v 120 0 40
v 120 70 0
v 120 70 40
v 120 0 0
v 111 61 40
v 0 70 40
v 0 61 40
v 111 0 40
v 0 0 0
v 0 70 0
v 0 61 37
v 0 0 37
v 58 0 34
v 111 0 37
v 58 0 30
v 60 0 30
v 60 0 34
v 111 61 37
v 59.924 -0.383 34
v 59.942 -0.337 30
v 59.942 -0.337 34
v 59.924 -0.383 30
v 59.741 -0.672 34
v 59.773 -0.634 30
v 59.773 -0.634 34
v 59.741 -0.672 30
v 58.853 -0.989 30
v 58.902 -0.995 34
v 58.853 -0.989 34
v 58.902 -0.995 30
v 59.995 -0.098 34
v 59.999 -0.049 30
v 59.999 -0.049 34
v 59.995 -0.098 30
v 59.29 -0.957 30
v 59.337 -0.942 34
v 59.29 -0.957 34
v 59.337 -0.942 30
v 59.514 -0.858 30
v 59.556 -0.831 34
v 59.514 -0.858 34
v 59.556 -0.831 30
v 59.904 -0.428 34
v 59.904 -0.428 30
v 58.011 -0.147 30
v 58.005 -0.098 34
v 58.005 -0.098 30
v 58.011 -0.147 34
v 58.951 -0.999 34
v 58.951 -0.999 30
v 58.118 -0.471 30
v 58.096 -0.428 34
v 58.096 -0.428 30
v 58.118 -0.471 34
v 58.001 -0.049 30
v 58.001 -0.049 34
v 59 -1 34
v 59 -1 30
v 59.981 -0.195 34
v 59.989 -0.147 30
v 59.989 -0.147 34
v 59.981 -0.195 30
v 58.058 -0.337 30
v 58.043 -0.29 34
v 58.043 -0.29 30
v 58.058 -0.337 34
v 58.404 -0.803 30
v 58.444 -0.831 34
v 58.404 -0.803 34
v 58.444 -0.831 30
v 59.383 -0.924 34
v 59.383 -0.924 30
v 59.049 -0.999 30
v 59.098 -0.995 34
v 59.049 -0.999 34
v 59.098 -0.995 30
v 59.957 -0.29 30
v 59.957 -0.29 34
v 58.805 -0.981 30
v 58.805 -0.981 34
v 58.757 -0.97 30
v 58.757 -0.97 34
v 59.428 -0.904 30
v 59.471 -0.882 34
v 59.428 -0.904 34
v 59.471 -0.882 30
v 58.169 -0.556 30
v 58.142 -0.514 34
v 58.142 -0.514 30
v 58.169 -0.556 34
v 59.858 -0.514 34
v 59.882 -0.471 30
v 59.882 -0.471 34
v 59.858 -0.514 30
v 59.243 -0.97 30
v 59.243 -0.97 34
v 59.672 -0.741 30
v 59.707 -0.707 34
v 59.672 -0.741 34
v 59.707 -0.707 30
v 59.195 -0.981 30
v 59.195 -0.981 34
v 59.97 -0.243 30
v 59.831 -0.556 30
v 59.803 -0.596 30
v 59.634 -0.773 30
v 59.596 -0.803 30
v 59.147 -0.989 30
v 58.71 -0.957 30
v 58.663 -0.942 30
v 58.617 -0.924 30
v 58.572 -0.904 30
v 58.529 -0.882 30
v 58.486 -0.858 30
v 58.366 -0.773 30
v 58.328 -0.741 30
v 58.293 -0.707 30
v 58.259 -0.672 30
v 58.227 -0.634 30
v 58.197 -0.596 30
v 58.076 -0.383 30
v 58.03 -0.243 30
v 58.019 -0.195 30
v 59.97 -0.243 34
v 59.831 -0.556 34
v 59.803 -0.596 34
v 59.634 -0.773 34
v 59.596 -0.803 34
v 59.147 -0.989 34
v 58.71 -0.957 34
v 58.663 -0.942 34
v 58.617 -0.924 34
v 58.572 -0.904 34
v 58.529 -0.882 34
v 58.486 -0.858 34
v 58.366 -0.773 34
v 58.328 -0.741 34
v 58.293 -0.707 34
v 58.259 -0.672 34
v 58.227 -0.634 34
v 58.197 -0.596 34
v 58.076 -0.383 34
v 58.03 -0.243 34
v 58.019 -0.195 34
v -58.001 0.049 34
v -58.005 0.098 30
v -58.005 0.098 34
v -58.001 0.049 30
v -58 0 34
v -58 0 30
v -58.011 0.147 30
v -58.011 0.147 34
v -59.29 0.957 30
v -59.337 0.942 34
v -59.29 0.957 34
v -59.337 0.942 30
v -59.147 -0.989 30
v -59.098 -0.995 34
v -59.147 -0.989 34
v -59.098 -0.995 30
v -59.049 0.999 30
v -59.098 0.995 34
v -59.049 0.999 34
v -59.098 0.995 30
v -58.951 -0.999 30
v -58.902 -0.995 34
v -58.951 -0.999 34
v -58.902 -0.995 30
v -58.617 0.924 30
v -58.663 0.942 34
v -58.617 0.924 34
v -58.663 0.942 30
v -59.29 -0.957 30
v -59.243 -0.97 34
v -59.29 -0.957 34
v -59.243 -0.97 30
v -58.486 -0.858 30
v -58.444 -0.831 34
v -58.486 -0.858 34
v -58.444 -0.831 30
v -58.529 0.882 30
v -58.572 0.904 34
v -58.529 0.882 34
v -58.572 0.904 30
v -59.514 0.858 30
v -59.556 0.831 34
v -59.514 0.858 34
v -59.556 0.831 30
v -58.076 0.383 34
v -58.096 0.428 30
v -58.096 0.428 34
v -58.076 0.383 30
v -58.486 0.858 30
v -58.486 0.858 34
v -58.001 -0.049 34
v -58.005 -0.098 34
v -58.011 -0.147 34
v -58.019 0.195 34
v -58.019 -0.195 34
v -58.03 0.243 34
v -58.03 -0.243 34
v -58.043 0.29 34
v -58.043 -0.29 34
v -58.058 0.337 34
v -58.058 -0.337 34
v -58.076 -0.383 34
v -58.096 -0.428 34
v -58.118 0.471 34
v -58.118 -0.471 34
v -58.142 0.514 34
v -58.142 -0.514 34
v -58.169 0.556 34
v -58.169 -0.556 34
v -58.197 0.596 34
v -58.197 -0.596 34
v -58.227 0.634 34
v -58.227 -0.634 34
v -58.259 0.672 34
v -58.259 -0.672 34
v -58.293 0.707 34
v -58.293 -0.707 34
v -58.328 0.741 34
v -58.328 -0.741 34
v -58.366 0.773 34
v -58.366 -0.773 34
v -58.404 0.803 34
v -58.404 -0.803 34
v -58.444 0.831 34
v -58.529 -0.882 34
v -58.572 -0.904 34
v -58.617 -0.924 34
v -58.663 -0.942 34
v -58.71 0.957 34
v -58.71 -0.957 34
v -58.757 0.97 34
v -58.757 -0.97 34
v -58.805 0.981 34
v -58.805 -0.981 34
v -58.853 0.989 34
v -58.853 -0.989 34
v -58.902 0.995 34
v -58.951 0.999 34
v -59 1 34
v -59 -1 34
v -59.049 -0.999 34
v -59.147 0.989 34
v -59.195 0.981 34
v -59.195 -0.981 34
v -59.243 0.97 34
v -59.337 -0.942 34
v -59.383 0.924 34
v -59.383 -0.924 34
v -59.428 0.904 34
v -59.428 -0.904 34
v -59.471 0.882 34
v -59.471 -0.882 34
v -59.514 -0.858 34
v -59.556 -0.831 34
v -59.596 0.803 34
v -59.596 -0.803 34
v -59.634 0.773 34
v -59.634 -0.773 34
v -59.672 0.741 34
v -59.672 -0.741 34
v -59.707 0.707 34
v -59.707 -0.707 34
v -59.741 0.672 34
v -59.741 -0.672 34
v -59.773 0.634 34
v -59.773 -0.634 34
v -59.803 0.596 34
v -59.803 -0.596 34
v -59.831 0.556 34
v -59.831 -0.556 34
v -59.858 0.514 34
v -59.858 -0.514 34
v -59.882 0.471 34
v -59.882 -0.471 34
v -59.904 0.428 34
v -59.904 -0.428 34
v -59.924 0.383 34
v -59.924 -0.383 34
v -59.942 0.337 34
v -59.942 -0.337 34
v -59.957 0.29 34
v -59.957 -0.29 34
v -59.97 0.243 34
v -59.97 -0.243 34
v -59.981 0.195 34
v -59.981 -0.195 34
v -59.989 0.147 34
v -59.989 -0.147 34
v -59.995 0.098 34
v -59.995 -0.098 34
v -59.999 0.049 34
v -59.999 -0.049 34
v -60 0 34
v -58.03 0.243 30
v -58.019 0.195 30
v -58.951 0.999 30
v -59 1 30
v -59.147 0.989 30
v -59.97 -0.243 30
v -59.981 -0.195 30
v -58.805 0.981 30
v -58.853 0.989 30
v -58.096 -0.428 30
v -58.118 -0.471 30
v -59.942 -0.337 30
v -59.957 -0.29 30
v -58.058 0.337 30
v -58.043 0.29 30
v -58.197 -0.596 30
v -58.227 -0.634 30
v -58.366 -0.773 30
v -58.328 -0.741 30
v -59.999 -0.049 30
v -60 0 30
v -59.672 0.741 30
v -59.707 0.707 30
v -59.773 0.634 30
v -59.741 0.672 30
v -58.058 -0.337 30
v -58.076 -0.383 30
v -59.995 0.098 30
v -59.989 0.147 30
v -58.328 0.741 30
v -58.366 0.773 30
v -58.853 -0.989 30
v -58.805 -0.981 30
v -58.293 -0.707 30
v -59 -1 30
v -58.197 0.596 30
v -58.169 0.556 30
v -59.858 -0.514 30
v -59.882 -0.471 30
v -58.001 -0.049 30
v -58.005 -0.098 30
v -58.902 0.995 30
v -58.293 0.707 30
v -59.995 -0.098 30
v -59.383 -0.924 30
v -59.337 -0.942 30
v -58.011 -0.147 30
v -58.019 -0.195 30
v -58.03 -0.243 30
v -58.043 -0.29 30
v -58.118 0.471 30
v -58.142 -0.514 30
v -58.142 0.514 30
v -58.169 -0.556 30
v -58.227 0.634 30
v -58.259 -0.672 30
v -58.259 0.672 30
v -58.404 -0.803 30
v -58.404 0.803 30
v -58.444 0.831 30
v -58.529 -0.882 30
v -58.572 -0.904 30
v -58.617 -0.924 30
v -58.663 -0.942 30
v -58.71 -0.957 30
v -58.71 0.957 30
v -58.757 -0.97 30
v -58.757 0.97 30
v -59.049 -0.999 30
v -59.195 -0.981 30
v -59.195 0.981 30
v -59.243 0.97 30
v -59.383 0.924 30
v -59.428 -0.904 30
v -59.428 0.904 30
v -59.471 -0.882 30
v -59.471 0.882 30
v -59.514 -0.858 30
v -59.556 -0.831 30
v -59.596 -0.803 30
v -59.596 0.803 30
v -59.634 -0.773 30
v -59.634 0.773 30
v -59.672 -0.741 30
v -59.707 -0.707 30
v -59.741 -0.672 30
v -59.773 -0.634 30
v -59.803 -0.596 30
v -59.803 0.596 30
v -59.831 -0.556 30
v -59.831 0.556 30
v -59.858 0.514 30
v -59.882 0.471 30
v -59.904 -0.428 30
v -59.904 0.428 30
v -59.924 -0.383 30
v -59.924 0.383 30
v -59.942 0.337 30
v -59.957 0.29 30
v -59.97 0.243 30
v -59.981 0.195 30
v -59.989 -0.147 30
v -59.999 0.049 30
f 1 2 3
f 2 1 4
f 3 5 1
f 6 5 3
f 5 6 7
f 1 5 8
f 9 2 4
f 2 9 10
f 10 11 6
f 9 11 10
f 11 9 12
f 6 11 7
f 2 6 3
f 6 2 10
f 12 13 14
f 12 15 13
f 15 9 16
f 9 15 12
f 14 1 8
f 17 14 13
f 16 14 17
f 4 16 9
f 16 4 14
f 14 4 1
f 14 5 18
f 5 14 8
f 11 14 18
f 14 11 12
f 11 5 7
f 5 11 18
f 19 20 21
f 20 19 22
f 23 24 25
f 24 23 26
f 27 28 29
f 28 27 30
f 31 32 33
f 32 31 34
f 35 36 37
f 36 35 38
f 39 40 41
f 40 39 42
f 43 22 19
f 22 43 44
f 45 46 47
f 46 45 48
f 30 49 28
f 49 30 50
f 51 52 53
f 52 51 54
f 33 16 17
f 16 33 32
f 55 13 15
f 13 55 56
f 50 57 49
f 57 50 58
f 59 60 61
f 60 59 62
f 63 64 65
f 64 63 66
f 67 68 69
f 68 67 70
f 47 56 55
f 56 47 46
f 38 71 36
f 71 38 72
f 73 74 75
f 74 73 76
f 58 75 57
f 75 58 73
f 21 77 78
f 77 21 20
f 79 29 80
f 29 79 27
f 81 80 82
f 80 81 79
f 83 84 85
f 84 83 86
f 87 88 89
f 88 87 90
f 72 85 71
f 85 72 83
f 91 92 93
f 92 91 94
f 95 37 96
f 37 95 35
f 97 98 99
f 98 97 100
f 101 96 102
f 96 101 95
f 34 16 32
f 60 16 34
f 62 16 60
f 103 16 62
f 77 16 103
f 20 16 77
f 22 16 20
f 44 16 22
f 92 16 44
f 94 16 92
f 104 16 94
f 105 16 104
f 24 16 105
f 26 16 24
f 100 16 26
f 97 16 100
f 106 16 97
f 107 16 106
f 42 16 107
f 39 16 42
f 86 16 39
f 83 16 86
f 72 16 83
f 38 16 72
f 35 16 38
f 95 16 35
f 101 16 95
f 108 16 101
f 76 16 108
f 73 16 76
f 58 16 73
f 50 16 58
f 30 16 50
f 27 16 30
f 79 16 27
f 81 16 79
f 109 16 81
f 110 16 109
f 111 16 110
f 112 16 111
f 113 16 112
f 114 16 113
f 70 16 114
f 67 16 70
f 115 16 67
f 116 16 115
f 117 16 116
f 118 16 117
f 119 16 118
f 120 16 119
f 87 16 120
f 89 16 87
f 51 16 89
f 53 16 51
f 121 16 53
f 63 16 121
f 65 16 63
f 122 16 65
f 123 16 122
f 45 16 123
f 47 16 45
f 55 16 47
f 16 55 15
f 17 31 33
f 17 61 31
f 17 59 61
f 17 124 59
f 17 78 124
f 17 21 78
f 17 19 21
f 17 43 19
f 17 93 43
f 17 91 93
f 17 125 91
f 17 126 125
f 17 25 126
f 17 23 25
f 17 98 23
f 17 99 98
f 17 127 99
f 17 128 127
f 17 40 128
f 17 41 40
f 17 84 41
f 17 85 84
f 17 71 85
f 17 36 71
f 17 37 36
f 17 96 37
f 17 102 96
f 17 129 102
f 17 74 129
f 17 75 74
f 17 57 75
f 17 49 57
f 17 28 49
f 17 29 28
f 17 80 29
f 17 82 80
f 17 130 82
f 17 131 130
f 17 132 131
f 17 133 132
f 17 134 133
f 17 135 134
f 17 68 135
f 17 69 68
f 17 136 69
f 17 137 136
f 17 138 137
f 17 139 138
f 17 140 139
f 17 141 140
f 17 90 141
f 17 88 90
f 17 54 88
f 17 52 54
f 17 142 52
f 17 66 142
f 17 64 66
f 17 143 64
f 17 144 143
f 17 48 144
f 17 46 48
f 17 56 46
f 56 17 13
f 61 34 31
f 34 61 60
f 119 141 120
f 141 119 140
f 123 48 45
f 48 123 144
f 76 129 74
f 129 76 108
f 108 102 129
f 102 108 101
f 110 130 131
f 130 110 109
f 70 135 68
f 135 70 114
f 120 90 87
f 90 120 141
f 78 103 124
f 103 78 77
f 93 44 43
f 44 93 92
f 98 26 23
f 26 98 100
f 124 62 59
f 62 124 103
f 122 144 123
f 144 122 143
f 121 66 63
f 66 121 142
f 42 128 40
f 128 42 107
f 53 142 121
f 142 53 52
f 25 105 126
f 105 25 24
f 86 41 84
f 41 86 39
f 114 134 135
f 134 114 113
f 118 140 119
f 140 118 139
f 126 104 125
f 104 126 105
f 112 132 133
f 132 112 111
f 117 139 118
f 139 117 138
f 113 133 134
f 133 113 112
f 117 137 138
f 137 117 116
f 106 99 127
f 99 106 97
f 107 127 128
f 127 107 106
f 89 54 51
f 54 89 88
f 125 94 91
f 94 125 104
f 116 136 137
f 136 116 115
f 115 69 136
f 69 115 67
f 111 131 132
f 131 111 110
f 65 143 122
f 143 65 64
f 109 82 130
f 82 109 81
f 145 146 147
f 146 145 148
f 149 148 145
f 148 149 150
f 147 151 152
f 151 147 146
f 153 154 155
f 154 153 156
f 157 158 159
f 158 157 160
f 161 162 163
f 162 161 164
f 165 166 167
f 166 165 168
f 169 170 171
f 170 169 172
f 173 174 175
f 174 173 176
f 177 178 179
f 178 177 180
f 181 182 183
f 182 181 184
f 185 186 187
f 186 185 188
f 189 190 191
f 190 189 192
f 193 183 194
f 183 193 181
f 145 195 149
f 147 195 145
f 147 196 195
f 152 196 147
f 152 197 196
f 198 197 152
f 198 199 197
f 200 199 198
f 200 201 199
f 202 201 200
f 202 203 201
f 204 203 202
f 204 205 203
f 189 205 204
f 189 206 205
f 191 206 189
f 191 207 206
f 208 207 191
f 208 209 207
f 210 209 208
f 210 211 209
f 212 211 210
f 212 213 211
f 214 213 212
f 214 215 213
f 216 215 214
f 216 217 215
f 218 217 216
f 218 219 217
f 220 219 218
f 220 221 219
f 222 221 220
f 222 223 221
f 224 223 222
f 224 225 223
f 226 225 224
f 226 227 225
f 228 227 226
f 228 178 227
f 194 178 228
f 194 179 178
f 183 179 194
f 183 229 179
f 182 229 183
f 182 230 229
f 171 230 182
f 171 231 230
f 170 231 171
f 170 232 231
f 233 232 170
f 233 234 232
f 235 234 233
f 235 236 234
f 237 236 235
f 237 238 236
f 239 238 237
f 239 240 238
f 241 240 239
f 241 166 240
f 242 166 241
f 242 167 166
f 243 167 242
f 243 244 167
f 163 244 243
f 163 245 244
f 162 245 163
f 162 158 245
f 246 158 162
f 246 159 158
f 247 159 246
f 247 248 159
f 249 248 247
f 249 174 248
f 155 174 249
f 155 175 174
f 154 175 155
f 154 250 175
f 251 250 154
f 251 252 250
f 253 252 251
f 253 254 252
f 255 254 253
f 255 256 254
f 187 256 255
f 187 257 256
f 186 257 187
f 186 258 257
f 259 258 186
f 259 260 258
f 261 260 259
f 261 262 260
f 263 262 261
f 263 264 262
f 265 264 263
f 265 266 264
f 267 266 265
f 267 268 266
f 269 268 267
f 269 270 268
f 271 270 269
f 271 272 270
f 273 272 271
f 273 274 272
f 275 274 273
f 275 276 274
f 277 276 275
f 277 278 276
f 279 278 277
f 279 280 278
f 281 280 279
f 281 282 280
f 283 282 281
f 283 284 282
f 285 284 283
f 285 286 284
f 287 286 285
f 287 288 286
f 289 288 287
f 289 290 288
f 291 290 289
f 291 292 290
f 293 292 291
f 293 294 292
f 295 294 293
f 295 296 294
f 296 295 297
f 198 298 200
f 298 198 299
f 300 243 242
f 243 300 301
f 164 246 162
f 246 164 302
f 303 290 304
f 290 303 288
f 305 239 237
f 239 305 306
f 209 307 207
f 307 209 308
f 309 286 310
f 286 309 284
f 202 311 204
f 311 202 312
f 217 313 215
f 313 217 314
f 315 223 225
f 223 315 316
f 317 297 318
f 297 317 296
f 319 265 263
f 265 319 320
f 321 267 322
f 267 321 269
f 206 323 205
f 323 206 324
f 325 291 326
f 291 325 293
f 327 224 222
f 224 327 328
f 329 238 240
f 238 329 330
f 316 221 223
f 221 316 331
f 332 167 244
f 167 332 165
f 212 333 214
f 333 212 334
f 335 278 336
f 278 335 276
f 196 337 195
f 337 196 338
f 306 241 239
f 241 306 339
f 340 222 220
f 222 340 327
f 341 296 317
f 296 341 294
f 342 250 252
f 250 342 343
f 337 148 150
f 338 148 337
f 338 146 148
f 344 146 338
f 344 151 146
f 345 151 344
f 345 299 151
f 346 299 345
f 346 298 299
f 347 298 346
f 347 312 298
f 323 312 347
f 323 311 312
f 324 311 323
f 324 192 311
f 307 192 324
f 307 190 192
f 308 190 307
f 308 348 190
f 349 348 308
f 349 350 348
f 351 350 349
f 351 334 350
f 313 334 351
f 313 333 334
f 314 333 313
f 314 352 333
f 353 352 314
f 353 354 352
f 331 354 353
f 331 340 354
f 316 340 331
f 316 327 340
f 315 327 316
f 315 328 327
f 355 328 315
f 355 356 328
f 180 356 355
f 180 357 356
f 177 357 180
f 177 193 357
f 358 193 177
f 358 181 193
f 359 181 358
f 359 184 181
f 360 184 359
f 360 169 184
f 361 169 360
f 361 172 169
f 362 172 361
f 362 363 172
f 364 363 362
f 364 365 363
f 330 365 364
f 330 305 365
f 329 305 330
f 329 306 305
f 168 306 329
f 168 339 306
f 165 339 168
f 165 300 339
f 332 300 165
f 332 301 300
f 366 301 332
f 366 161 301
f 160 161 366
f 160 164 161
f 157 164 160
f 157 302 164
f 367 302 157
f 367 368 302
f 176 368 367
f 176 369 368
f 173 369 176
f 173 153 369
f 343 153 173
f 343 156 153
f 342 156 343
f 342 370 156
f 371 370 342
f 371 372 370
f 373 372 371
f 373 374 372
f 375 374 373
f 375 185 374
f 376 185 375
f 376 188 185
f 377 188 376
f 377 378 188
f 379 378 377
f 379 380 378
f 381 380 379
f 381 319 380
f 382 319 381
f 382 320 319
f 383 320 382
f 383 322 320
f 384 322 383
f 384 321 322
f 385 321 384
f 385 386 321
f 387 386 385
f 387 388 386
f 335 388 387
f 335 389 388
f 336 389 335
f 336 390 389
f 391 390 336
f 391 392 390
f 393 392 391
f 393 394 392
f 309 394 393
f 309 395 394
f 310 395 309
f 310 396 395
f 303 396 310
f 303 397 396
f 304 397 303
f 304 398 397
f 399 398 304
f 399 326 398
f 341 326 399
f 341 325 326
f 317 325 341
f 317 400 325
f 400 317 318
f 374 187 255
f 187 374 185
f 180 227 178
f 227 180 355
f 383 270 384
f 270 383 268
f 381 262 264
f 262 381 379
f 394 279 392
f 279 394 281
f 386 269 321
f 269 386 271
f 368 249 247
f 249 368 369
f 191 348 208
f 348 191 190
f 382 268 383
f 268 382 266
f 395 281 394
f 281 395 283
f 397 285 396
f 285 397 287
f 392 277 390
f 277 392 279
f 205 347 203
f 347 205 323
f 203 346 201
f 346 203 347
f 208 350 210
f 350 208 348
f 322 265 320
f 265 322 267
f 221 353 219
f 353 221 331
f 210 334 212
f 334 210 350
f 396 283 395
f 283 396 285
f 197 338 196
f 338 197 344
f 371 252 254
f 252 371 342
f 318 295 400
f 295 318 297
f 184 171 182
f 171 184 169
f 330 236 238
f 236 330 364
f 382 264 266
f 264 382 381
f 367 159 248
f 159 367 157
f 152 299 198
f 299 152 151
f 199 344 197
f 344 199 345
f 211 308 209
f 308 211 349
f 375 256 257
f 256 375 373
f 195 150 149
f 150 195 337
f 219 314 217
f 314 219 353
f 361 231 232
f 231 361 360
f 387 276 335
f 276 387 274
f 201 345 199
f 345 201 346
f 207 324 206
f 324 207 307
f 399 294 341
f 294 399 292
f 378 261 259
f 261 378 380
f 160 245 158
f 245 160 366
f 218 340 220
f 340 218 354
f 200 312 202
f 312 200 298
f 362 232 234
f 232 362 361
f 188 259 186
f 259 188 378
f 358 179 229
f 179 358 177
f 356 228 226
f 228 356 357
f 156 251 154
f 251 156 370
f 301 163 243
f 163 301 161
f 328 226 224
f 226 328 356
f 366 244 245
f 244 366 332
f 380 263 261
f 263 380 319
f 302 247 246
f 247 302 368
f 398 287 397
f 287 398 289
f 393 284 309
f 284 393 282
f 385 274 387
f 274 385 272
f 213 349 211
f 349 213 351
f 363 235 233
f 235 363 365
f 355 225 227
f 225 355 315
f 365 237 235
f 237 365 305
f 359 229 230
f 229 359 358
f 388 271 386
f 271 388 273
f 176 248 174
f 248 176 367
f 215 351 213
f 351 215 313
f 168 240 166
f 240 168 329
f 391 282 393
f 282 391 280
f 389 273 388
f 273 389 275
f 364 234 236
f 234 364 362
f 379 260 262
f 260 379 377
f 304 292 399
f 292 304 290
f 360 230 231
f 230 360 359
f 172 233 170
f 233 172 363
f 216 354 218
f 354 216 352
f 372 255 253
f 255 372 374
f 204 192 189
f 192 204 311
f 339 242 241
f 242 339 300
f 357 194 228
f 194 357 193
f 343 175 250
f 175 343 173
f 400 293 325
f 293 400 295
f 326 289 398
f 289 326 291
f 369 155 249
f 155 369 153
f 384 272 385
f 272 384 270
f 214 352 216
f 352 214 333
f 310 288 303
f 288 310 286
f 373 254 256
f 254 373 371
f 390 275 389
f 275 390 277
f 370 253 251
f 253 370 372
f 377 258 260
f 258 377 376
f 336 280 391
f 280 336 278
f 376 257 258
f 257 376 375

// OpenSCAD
// Buffer Tank for Mini Horizontal Gel Electrophoresis
// Units: millimetres

// Outer Dimensions
$w_outer = 120; // Width (X)
$d_outer = 70;  // Depth (Y)
$h_outer = 40;  // Height (Z)

// Wall and Floor Thickness
$wall_thick = 3;
$floor_thick = 3;

// Platform Dimensions
$plat_len = 60;   // Length in X
$plat_width = $d_outer; // Spans full inner width
$plat_height = 10; // Height above inner floor
$plat_z_base = $floor_thick + $plat_height; // Z position of platform top

// Hole Dimensions
$hole_dia = 2;
$hole_y = 0;
$hole_z = 30;

// Configuration
$fn = 128; // High resolution for smooth curves

// Derived Dimensions
$w_inner = $w_outer - 2*$wall_thick;
$d_inner = $d_outer - 2*$wall_thick;
$h_inner = $h_outer - $floor_thick;

// Main Tank Body (Open Top)
// Constructed by taking a solid block and subtracting the top opening
difference() {
    // 1. Solid Block
    cube([
        $w_outer, 
        $d_outer, 
        $h_outer
    ]);
    
    // 2. Cut out the top opening (Open Top)
    // The opening is the inner dimensions, extending from the top down to the floor thickness
    translate([
        -$wall_thick, 
        -$wall_thick, 
        $h_outer - $floor_thick
    ])
    cube([
        $w_inner, 
        $d_inner, 
        $floor_thick
    ]);
}

// Platform (Raised in the middle)
// Positioned relative to the tank body
translate([
    ($w_outer - $plat_len)/2, // Center in X
    0,                         // Center in Y (aligned with tank center)
    $floor_thick              // Base on the floor
])
difference() {
    // 1. Solid Platform Block
    cube([
        $plat_len, 
        $plat_width, 
        $plat_height
    ]);
    
    // 2. Cut out the top opening of the platform (to match tank opening)
    // The platform is solid up to its top, but the tank opening cuts through it.
    // We need to subtract the volume of the tank opening that overlaps with the platform.
    // Tank opening top is at z = h_outer - floor_thick.
    // Platform top is at z = floor_thick + plat_height.
    // Since the tank is open top, the platform is effectively cut through at the tank's top level.
    
    // Calculate the Z range to cut: from platform top down to the tank opening level
    $cut_start_z = $floor_thick + $plat_height;
    $cut_end_z = $h_outer - $floor_thick;
    
    // If the platform is lower than the tank opening, we don't need to cut the top of the platform
    // because the tank opening is already there. However, the prompt implies the platform divides the bottom.
    // The tank is open at the top. The platform sits inside.
    // The "cut" is actually the tank opening itself.
    // We need to subtract the volume defined by the tank's inner cross-section, 
    // starting from the platform's top surface up to the tank's top opening.
    
    if ($cut_start_z < $cut_end_z) {
        translate([
            -$wall_thick, 
            -$wall_thick, 
            $cut_start_z
        ])
        cube([
            $w_inner, 
            $d_inner, 
            $cut_end_z - $cut_start_z
        ]);
    }
}

// Electrode Holes
// Drilled through the end walls (X ends) at specific Y and Z
// We use a loop to create two holes (left and right ends)
$hole_offset_x = ($w_outer / 2) - ($hole_dia / 2);
$hole_offset_x_left = -$hole_offset_x;
$hole_offset_x_right = $hole_offset_x;

for (side = [1, -1]) {
    translate([
        side * $hole_offset_x,
        $hole_y,
        $hole_z
    ])
    difference() {
        // Create a cylinder that extends slightly past the wall thickness to ensure clean cut
        // Wall thickness is 3mm. We extend 0.5mm past each side.
        $cyl_len = $wall_thick + 1; 
        
        cylinder(
            h = $cyl_len,
            r = $hole_dia / 2,
            $fn = $fn
        );
        
        // Optional: If the hole needs to go all the way through the tank depth (Y), 
        // we would subtract a larger cylinder. The prompt says "horizontal hole along X".
        // Usually, this means a hole through the wall thickness. 
        // If it needs to go through the whole tank depth, the logic changes.
        // "Through each end wall... drill a 2 mm diameter horizontal hole along X"
        // This implies a hole through the 3mm wall.
    }
}
